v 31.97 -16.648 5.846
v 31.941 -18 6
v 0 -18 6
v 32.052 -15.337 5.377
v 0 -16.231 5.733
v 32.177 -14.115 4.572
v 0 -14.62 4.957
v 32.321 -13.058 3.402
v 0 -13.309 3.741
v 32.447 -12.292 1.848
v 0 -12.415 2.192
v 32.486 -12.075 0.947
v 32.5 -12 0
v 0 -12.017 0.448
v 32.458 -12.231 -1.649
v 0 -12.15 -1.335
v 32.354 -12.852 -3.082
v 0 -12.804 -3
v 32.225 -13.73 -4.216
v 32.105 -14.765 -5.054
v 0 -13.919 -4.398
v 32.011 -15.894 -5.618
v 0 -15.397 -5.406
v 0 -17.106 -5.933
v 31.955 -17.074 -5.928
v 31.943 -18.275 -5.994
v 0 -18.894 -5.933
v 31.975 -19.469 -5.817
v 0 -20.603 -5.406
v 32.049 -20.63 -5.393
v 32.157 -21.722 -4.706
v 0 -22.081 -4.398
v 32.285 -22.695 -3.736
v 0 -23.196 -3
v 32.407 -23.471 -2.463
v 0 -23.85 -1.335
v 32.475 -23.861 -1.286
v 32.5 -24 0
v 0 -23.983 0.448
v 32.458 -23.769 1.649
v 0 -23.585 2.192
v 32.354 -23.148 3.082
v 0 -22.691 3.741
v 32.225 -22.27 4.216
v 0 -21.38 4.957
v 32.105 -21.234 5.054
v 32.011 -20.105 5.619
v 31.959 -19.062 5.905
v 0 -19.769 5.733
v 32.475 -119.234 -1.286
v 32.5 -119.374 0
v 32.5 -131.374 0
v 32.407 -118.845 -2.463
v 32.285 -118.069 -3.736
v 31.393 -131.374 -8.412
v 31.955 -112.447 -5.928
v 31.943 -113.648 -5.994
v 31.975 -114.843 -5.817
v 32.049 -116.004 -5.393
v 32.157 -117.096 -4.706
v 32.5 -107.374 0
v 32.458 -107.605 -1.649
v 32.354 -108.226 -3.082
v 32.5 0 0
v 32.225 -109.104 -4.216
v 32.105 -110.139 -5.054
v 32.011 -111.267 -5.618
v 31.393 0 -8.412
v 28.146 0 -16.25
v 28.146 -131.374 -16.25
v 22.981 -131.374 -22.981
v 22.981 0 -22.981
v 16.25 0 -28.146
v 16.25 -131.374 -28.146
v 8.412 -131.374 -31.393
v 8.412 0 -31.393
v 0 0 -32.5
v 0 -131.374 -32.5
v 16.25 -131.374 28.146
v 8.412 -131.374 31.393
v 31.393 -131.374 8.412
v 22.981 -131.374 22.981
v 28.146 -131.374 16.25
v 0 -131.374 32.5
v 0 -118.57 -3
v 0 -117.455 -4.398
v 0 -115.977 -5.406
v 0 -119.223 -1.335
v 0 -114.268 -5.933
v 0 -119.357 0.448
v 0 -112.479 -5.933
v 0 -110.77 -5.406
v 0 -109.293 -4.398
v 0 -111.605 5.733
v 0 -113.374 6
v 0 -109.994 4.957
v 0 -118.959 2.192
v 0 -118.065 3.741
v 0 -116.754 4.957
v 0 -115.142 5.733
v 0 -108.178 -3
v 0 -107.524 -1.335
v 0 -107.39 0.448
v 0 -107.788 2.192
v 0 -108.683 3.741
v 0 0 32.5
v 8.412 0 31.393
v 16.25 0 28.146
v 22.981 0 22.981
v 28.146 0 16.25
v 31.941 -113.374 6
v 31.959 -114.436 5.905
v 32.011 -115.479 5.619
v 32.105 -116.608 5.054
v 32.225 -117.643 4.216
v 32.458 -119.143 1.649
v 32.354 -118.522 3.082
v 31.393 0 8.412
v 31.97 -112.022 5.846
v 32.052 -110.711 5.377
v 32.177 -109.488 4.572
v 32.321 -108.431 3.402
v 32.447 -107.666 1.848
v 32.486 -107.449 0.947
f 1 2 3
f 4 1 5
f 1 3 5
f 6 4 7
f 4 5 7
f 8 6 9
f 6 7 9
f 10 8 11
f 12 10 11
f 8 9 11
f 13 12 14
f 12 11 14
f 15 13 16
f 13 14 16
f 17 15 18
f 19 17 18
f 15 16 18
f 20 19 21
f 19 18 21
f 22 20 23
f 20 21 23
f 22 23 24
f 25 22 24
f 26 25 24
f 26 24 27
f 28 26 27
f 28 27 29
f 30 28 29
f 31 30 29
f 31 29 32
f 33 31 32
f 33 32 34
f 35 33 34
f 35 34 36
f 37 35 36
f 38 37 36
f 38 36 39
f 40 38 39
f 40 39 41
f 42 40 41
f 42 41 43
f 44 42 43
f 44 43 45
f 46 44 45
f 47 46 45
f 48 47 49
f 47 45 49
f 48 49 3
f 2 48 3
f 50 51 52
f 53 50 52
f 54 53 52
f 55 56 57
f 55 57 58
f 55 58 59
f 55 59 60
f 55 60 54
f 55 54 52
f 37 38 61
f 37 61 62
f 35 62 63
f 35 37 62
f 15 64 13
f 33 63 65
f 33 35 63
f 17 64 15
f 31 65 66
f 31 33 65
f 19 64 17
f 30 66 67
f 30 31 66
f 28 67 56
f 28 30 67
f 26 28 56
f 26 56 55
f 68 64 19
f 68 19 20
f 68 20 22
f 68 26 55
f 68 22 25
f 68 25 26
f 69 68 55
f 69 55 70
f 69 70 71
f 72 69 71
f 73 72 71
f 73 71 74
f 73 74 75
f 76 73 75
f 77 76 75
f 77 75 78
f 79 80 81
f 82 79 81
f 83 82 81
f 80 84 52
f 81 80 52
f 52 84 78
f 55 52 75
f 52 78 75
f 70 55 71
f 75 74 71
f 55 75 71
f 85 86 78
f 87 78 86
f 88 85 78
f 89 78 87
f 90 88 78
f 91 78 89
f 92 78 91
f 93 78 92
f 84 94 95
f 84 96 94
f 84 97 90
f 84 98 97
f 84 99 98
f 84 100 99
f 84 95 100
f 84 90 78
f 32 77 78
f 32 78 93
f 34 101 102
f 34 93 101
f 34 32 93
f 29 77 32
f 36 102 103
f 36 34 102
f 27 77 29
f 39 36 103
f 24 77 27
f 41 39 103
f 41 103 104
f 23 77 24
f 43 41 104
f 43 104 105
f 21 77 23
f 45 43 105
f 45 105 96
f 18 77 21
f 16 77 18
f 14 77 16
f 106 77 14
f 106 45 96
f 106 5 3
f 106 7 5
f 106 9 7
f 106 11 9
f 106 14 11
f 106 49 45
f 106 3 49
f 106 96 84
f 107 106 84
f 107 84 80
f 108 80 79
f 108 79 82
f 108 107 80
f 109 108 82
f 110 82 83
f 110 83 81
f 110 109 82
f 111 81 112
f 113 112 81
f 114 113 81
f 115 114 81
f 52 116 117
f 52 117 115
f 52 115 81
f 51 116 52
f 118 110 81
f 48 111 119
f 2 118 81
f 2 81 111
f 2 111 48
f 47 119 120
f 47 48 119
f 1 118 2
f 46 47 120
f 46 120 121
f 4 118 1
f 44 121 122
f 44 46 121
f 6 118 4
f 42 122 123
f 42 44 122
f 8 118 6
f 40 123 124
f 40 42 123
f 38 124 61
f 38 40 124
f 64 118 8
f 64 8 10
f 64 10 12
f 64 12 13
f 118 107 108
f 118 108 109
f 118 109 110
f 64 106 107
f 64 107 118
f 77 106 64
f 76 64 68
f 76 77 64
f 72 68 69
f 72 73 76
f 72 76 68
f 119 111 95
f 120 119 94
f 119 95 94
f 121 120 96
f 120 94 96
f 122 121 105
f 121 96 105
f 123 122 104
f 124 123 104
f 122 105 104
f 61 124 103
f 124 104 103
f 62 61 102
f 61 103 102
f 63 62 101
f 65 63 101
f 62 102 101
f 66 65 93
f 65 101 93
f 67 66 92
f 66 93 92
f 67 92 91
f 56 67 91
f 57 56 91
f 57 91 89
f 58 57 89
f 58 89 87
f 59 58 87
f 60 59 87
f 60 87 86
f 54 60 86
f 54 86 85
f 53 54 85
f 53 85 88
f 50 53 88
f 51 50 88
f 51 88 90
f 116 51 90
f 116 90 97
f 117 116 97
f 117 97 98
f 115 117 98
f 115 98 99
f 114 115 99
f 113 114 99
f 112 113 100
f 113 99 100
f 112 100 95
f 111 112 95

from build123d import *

# Parameters (mm, degrees)
BOSS_EXTRUDE2_DEPTH = 131.3737
SKETCH2_R           = 6
CUT_EXTRUDE1_DEPTH  = 59


with BuildPart() as part:
    # Sketch1 → Boss-Extrude2 (new body)
    with BuildSketch(Plane(origin=(0, 0, 0), x_dir=(1, 0, 0), z_dir=(0, 1, 0))):
        with BuildLine():
            ThreePointArc((32.5, 0), (22.980970389, 22.980970389), (0, 32.5))
            Line((0, 32.5), (0, -32.5))
            ThreePointArc((0, -32.5), (22.980970389, -22.980970389), (32.5, 0))
        make_face()
    extrude(amount=-BOSS_EXTRUDE2_DEPTH)

    # Sketch2 → Cut-Extrude1 (cut)
    with BuildSketch(Plane.ZY):
        with Locations((0, -18)):
            Circle(SKETCH2_R)
        with Locations((0, -113.3737)):
            Circle(SKETCH2_R)
    extrude(amount=-CUT_EXTRUDE1_DEPTH, mode=Mode.SUBTRACT)


solid = part.part
